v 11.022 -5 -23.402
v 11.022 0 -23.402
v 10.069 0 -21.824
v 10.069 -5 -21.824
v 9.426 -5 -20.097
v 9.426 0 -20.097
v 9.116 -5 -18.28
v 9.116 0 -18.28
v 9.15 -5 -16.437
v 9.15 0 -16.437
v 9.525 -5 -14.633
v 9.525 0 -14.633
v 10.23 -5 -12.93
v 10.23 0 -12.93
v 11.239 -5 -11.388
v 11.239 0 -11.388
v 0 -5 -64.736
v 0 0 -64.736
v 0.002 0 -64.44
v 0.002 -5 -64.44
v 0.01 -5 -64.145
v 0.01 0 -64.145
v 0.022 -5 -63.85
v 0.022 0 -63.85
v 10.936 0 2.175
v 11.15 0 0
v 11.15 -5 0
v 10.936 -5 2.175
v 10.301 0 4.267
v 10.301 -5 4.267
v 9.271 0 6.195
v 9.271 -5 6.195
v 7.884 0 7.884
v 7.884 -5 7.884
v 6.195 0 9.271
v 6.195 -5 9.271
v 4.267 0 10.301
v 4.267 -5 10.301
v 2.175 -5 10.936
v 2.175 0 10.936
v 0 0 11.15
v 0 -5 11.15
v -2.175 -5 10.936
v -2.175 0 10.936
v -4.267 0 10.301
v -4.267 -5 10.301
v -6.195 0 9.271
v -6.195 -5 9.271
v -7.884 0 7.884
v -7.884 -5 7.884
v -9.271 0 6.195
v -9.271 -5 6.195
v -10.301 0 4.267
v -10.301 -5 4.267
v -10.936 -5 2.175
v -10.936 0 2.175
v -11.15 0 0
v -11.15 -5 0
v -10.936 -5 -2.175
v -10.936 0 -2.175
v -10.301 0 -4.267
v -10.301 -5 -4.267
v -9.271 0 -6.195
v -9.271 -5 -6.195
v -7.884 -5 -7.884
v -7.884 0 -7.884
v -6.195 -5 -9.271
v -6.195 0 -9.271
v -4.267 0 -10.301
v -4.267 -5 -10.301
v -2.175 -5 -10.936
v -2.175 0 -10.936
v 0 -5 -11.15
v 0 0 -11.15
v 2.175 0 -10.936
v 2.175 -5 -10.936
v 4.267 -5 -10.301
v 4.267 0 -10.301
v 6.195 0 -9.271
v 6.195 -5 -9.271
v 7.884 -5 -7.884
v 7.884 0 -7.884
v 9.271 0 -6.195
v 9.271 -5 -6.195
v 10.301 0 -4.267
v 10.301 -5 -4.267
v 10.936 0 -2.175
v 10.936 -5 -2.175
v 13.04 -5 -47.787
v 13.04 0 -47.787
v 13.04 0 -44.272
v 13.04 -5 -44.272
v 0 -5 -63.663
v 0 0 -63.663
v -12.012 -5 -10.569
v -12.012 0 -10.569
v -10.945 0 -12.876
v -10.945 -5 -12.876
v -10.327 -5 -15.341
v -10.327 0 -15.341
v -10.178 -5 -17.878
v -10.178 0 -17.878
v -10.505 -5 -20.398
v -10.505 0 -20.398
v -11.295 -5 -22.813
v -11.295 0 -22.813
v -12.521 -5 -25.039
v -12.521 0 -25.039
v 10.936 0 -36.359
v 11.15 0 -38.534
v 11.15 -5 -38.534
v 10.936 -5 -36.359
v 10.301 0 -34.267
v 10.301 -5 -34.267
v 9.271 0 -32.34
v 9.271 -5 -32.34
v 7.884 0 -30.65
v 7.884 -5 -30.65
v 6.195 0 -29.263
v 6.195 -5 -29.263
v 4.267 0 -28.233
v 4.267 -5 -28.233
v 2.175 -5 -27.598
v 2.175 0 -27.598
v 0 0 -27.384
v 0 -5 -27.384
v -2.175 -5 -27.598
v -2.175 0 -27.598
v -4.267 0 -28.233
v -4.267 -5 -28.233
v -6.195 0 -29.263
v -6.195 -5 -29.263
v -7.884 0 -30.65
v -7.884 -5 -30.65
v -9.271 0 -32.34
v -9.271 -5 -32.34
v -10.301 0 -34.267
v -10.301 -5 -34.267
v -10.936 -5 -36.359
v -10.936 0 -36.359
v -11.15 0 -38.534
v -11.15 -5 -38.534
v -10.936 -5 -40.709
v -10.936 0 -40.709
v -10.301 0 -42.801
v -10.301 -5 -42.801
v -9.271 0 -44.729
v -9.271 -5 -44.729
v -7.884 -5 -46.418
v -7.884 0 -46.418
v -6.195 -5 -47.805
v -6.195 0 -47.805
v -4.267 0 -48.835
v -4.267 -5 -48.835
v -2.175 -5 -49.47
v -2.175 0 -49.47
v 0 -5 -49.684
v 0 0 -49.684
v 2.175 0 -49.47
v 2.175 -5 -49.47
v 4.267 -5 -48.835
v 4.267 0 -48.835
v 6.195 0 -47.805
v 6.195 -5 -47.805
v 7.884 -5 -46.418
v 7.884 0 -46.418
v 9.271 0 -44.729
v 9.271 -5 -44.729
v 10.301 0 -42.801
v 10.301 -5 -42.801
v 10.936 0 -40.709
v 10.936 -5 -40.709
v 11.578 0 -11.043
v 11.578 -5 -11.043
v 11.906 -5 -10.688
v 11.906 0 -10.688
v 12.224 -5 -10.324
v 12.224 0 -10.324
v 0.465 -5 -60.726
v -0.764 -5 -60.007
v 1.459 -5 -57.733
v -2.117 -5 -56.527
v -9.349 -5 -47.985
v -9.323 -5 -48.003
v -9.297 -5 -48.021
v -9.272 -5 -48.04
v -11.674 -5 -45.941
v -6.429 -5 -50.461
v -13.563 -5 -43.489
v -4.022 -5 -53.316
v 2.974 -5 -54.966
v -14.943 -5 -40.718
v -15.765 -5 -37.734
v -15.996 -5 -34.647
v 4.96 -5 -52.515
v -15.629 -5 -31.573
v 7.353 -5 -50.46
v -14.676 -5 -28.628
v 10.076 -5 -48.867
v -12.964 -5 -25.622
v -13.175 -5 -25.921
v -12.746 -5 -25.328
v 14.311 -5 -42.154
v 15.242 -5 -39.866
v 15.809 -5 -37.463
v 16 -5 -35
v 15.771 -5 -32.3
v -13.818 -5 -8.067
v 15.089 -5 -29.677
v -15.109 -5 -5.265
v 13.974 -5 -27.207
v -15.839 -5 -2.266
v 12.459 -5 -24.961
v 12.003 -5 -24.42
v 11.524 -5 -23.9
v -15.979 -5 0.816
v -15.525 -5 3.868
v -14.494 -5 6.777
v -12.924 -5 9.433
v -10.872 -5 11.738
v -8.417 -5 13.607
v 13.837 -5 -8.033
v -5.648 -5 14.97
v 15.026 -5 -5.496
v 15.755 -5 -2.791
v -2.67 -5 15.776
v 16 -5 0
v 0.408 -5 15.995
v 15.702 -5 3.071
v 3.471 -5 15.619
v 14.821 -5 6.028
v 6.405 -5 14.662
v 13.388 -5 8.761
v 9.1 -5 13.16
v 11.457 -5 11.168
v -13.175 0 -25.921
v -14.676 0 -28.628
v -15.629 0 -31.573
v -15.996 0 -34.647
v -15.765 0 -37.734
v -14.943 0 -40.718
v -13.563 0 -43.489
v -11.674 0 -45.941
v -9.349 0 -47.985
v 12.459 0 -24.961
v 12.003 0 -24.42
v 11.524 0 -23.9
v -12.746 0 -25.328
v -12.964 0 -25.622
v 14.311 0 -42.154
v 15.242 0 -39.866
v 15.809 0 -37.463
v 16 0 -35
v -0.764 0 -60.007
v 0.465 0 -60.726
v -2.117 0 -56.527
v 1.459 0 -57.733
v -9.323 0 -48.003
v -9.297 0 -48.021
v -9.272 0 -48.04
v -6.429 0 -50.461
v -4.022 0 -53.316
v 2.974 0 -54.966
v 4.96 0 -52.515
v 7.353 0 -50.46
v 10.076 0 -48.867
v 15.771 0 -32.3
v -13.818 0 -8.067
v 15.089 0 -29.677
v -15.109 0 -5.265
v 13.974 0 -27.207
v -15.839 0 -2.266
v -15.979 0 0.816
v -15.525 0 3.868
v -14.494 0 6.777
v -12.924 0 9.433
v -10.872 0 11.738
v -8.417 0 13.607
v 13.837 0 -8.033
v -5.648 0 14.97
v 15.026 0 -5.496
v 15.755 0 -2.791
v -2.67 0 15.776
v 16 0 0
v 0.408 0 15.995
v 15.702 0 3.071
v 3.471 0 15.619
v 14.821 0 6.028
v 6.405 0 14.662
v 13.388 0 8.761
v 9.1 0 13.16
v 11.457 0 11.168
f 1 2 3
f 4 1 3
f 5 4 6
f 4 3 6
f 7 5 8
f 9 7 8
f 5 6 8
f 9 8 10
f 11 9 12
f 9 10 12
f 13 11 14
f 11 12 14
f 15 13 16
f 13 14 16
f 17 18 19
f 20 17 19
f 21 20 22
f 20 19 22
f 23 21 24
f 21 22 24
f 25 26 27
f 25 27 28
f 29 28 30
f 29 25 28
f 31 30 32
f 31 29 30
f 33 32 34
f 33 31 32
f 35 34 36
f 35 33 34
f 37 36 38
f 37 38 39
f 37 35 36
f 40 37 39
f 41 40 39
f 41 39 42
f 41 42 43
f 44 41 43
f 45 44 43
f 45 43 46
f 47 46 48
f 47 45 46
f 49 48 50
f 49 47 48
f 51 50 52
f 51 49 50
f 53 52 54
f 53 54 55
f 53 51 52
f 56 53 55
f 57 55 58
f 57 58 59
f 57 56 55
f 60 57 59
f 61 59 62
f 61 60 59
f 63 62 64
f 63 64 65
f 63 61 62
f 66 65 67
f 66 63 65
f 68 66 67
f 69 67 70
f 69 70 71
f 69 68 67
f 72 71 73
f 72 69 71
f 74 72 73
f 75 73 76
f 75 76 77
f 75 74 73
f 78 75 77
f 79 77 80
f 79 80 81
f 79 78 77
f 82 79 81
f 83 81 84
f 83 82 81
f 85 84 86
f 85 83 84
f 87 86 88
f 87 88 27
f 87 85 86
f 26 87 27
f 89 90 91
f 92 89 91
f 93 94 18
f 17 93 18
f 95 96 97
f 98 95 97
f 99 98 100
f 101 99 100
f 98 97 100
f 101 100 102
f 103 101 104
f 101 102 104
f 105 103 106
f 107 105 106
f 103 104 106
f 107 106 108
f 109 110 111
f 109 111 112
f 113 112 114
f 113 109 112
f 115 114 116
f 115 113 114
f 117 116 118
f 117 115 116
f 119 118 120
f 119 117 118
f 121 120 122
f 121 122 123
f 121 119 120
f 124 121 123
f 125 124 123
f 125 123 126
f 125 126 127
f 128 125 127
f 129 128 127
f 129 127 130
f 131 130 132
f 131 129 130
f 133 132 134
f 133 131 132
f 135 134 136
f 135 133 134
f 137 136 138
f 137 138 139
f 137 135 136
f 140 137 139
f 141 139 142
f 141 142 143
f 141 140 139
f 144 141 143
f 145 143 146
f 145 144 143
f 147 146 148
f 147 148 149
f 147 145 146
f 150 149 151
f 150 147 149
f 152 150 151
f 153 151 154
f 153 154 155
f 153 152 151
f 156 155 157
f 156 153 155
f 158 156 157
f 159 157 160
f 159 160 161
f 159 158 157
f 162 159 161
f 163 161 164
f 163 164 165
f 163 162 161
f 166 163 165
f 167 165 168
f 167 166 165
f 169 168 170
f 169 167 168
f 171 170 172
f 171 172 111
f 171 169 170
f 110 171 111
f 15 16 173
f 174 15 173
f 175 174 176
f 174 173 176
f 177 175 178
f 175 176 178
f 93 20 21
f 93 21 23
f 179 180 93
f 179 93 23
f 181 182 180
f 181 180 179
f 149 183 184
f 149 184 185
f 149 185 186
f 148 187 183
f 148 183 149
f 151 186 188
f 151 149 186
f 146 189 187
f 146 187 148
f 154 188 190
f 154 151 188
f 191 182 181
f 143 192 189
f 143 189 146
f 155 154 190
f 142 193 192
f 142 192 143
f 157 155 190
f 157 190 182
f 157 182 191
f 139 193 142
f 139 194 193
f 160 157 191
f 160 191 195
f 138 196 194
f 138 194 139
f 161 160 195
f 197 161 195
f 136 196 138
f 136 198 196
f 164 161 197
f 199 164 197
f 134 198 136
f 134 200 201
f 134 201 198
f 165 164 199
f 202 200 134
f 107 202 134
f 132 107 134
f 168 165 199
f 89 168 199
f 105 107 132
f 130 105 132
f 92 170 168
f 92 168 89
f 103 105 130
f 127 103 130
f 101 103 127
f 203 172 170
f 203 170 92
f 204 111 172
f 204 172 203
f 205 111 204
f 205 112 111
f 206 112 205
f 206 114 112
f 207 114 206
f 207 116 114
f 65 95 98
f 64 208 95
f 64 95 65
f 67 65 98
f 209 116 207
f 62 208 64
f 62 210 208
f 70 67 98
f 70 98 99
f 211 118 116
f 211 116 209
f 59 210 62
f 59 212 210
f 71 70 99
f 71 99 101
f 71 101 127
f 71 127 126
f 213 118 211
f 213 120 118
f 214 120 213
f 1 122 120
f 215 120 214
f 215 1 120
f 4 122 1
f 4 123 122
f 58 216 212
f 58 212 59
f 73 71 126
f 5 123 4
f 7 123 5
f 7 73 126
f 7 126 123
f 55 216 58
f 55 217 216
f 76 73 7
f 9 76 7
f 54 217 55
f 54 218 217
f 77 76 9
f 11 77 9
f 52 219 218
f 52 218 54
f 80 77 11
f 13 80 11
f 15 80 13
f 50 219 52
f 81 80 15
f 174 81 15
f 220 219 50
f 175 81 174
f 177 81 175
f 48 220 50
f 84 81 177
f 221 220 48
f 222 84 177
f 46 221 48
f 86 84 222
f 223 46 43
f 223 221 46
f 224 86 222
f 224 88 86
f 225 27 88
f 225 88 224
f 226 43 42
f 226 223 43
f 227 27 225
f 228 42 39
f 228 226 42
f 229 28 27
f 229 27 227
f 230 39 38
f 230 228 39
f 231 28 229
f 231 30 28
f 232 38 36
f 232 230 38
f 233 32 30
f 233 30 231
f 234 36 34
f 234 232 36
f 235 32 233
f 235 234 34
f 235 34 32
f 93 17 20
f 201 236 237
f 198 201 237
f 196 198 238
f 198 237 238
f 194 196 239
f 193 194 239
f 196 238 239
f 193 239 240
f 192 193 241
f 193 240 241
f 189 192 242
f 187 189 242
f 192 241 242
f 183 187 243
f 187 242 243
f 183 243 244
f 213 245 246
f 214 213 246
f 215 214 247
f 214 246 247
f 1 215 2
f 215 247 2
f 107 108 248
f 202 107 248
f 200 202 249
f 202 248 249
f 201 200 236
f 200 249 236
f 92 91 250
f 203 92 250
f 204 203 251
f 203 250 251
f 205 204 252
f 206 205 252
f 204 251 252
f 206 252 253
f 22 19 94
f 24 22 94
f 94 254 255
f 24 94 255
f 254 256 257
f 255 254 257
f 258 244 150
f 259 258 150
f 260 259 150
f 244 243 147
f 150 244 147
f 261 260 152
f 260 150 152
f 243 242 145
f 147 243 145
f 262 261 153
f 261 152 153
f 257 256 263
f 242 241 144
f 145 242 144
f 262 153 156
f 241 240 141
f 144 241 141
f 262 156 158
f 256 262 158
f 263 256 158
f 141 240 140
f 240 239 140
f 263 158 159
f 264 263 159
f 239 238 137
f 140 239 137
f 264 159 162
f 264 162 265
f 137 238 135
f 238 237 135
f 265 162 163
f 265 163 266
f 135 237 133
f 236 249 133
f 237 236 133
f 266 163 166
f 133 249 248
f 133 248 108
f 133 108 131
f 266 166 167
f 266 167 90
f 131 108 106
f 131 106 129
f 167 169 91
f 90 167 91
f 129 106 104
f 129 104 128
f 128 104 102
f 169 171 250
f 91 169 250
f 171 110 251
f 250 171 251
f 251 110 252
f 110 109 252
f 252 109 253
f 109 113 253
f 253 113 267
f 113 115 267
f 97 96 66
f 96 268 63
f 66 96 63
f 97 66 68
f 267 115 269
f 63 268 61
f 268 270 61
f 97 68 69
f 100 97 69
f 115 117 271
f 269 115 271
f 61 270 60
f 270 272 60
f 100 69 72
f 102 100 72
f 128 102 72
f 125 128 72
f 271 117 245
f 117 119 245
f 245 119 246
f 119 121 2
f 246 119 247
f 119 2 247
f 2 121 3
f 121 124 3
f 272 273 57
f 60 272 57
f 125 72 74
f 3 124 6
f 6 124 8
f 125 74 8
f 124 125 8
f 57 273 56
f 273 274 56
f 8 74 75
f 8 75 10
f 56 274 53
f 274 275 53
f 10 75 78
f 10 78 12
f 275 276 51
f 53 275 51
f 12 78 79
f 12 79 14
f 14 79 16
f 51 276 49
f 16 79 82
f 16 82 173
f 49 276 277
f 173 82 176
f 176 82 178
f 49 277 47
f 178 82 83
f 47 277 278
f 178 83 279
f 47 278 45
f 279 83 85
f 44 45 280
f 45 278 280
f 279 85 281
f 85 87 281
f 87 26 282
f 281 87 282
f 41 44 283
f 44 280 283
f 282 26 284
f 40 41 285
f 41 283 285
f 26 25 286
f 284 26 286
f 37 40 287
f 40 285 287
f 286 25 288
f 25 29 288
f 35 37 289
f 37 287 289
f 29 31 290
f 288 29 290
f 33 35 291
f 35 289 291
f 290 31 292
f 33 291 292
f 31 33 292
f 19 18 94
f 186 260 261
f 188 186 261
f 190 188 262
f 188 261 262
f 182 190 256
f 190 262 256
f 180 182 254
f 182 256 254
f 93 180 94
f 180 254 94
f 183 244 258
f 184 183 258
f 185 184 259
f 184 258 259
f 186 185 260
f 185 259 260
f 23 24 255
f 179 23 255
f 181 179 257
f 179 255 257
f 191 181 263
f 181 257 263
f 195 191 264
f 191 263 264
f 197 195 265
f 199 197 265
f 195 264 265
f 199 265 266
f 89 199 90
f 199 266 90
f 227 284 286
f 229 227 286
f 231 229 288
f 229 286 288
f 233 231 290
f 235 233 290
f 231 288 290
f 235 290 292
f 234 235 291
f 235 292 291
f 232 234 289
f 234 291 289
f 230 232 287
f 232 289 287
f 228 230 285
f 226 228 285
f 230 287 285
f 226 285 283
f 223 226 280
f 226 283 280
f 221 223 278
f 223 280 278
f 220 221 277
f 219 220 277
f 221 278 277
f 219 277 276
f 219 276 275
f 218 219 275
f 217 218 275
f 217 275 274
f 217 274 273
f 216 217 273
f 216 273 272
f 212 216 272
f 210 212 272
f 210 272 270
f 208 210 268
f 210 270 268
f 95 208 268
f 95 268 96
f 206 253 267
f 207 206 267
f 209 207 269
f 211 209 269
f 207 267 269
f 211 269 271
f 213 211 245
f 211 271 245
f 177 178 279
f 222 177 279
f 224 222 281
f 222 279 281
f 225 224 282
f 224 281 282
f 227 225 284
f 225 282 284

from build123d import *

# Parameters (mm, degrees)
F1_DEPTH = 5
F2_R     = 11.15
F3_DEPTH = 5
F5_COUNT = 3


with BuildPart() as f1:
    # F0 (on Front) → F1 (new body)
    with BuildSketch(Plane.XZ):
        with BuildLine():
            ThreePointArc((12.223679, -10.32384), (15.026291, -5.496414), (16, 0))
            ThreePointArc((16, 0), (-5.648343, 14.969844), (-12.012028, -10.569351))
            ThreePointArc((-12.012028, -10.569351), (-0.562686, -15.990103), (11.239372, -11.38756))
            ThreePointArc((11.239372, -11.38756), (11.711961, -10.837596), (12.223679, -10.32384))
        make_face()
        with BuildLine():
            ThreePointArc((11.239372, -11.38756), (-0.562686, -15.990103), (-12.012028, -10.569351))
            ThreePointArc((-12.012028, -10.569351), (-10.178101, -17.877857), (-12.521378, -25.039323))
            ThreePointArc((-12.521378, -25.039323), (-1.11025, -19.038567), (11.021772, -23.401701))
            ThreePointArc((11.021772, -23.401701), (9.08978, -17.357668), (11.239372, -11.38756))
        make_face()
        with BuildLine():
            ThreePointArc((11.239372, -11.38756), (11.743575, -10.86685), (12.223679, -10.32384))
            ThreePointArc((12.223679, -10.32384), (11.711961, -10.837596), (11.239372, -11.38756))
        make_face()
        with BuildLine():
            ThreePointArc((-13.174834, -25.921247), (-12.839194, -25.486888), (-12.521378, -25.039323))
            ThreePointArc((-12.521378, -25.039323), (-12.855671, -25.47468), (-13.174834, -25.921247))
        make_face()
        with BuildLine():
            ThreePointArc((11.021772, -23.401701), (-1.11025, -19.038567), (-12.521378, -25.039323))
            ThreePointArc((-12.521378, -25.039323), (-12.839194, -25.486888), (-13.174834, -25.921247))
            ThreePointArc((-13.174834, -25.921247), (-15.764732, -37.733723), (-9.348894, -47.984536))
            ThreePointArc((-9.348894, -47.984536), (-9.310283, -48.012249), (-9.271591, -48.039847))
            ThreePointArc((-9.271591, -48.039847), (-4.866336, -50.242007), (0, -51))
            ThreePointArc((0, -51), (7.33666, -49.21877), (13.039785, -44.271678))
            ThreePointArc((13.039785, -44.271678), (15.241991, -39.866387), (16, -35))
            ThreePointArc((16, -35), (15.088679, -29.677241), (12.45853, -24.960825))
            ThreePointArc((12.45853, -24.960825), (11.698135, -24.219982), (11.021772, -23.401701))
        make_face()
        with BuildLine():
            ThreePointArc((12.45853, -24.960825), (11.766004, -24.157439), (11.021772, -23.401701))
            ThreePointArc((11.021772, -23.401701), (11.698135, -24.219982), (12.45853, -24.960825))
        make_face()
        with BuildLine():
            ThreePointArc((0, -51), (-4.866336, -50.242007), (-9.271591, -48.039847))
            ThreePointArc((-9.271591, -48.039847), (-3.003319, -54.882391), (0, -63.662581))
            Line((0, -63.662581), (0, -51))
        make_face()
        with BuildLine():
            Line((13.039785, -47.787126), (13.039785, -44.271678))
            ThreePointArc((13.039785, -44.271678), (7.33666, -49.21877), (0, -51))
            Line((0, -51), (0, -63.662581))
            ThreePointArc((0, -63.662581), (0.011408, -63.756024), (0.022428, -63.849514))
            ThreePointArc((0.022428, -63.849514), (3.912004, -53.695735), (13.039785, -47.787126))
        make_face()
        with BuildLine():
            ThreePointArc((0.022428, -63.849514), (0.011408, -63.756024), (0, -63.662581))
            Line((0, -63.662581), (0, -64.736106))
            ThreePointArc((0, -64.736106), (0.005608, -64.292668), (0.022428, -63.849514))
        make_face()
    extrude(amount=F1_DEPTH)

    # F2 (on Front) → F3 (cut, through all)
    with BuildSketch(Plane.XZ):
        Circle(F2_R)
        with Locations((0, -38.534194)):
            Circle(F2_R)
    extrude(amount=F3_DEPTH, mode=Mode.SUBTRACT)


with BuildPart() as f5_1:
    # F5: instance of F1
    add(f1.part.rotate(Axis((0, 15.020472, 0), (0, 1, 0)), 1 * 360 / F5_COUNT))


with BuildPart() as f5_2:
    # F5: instance of F1
    add(f1.part.rotate(Axis((0, 15.020472, 0), (0, 1, 0)), 2 * 360 / F5_COUNT))


solid = f1.part
